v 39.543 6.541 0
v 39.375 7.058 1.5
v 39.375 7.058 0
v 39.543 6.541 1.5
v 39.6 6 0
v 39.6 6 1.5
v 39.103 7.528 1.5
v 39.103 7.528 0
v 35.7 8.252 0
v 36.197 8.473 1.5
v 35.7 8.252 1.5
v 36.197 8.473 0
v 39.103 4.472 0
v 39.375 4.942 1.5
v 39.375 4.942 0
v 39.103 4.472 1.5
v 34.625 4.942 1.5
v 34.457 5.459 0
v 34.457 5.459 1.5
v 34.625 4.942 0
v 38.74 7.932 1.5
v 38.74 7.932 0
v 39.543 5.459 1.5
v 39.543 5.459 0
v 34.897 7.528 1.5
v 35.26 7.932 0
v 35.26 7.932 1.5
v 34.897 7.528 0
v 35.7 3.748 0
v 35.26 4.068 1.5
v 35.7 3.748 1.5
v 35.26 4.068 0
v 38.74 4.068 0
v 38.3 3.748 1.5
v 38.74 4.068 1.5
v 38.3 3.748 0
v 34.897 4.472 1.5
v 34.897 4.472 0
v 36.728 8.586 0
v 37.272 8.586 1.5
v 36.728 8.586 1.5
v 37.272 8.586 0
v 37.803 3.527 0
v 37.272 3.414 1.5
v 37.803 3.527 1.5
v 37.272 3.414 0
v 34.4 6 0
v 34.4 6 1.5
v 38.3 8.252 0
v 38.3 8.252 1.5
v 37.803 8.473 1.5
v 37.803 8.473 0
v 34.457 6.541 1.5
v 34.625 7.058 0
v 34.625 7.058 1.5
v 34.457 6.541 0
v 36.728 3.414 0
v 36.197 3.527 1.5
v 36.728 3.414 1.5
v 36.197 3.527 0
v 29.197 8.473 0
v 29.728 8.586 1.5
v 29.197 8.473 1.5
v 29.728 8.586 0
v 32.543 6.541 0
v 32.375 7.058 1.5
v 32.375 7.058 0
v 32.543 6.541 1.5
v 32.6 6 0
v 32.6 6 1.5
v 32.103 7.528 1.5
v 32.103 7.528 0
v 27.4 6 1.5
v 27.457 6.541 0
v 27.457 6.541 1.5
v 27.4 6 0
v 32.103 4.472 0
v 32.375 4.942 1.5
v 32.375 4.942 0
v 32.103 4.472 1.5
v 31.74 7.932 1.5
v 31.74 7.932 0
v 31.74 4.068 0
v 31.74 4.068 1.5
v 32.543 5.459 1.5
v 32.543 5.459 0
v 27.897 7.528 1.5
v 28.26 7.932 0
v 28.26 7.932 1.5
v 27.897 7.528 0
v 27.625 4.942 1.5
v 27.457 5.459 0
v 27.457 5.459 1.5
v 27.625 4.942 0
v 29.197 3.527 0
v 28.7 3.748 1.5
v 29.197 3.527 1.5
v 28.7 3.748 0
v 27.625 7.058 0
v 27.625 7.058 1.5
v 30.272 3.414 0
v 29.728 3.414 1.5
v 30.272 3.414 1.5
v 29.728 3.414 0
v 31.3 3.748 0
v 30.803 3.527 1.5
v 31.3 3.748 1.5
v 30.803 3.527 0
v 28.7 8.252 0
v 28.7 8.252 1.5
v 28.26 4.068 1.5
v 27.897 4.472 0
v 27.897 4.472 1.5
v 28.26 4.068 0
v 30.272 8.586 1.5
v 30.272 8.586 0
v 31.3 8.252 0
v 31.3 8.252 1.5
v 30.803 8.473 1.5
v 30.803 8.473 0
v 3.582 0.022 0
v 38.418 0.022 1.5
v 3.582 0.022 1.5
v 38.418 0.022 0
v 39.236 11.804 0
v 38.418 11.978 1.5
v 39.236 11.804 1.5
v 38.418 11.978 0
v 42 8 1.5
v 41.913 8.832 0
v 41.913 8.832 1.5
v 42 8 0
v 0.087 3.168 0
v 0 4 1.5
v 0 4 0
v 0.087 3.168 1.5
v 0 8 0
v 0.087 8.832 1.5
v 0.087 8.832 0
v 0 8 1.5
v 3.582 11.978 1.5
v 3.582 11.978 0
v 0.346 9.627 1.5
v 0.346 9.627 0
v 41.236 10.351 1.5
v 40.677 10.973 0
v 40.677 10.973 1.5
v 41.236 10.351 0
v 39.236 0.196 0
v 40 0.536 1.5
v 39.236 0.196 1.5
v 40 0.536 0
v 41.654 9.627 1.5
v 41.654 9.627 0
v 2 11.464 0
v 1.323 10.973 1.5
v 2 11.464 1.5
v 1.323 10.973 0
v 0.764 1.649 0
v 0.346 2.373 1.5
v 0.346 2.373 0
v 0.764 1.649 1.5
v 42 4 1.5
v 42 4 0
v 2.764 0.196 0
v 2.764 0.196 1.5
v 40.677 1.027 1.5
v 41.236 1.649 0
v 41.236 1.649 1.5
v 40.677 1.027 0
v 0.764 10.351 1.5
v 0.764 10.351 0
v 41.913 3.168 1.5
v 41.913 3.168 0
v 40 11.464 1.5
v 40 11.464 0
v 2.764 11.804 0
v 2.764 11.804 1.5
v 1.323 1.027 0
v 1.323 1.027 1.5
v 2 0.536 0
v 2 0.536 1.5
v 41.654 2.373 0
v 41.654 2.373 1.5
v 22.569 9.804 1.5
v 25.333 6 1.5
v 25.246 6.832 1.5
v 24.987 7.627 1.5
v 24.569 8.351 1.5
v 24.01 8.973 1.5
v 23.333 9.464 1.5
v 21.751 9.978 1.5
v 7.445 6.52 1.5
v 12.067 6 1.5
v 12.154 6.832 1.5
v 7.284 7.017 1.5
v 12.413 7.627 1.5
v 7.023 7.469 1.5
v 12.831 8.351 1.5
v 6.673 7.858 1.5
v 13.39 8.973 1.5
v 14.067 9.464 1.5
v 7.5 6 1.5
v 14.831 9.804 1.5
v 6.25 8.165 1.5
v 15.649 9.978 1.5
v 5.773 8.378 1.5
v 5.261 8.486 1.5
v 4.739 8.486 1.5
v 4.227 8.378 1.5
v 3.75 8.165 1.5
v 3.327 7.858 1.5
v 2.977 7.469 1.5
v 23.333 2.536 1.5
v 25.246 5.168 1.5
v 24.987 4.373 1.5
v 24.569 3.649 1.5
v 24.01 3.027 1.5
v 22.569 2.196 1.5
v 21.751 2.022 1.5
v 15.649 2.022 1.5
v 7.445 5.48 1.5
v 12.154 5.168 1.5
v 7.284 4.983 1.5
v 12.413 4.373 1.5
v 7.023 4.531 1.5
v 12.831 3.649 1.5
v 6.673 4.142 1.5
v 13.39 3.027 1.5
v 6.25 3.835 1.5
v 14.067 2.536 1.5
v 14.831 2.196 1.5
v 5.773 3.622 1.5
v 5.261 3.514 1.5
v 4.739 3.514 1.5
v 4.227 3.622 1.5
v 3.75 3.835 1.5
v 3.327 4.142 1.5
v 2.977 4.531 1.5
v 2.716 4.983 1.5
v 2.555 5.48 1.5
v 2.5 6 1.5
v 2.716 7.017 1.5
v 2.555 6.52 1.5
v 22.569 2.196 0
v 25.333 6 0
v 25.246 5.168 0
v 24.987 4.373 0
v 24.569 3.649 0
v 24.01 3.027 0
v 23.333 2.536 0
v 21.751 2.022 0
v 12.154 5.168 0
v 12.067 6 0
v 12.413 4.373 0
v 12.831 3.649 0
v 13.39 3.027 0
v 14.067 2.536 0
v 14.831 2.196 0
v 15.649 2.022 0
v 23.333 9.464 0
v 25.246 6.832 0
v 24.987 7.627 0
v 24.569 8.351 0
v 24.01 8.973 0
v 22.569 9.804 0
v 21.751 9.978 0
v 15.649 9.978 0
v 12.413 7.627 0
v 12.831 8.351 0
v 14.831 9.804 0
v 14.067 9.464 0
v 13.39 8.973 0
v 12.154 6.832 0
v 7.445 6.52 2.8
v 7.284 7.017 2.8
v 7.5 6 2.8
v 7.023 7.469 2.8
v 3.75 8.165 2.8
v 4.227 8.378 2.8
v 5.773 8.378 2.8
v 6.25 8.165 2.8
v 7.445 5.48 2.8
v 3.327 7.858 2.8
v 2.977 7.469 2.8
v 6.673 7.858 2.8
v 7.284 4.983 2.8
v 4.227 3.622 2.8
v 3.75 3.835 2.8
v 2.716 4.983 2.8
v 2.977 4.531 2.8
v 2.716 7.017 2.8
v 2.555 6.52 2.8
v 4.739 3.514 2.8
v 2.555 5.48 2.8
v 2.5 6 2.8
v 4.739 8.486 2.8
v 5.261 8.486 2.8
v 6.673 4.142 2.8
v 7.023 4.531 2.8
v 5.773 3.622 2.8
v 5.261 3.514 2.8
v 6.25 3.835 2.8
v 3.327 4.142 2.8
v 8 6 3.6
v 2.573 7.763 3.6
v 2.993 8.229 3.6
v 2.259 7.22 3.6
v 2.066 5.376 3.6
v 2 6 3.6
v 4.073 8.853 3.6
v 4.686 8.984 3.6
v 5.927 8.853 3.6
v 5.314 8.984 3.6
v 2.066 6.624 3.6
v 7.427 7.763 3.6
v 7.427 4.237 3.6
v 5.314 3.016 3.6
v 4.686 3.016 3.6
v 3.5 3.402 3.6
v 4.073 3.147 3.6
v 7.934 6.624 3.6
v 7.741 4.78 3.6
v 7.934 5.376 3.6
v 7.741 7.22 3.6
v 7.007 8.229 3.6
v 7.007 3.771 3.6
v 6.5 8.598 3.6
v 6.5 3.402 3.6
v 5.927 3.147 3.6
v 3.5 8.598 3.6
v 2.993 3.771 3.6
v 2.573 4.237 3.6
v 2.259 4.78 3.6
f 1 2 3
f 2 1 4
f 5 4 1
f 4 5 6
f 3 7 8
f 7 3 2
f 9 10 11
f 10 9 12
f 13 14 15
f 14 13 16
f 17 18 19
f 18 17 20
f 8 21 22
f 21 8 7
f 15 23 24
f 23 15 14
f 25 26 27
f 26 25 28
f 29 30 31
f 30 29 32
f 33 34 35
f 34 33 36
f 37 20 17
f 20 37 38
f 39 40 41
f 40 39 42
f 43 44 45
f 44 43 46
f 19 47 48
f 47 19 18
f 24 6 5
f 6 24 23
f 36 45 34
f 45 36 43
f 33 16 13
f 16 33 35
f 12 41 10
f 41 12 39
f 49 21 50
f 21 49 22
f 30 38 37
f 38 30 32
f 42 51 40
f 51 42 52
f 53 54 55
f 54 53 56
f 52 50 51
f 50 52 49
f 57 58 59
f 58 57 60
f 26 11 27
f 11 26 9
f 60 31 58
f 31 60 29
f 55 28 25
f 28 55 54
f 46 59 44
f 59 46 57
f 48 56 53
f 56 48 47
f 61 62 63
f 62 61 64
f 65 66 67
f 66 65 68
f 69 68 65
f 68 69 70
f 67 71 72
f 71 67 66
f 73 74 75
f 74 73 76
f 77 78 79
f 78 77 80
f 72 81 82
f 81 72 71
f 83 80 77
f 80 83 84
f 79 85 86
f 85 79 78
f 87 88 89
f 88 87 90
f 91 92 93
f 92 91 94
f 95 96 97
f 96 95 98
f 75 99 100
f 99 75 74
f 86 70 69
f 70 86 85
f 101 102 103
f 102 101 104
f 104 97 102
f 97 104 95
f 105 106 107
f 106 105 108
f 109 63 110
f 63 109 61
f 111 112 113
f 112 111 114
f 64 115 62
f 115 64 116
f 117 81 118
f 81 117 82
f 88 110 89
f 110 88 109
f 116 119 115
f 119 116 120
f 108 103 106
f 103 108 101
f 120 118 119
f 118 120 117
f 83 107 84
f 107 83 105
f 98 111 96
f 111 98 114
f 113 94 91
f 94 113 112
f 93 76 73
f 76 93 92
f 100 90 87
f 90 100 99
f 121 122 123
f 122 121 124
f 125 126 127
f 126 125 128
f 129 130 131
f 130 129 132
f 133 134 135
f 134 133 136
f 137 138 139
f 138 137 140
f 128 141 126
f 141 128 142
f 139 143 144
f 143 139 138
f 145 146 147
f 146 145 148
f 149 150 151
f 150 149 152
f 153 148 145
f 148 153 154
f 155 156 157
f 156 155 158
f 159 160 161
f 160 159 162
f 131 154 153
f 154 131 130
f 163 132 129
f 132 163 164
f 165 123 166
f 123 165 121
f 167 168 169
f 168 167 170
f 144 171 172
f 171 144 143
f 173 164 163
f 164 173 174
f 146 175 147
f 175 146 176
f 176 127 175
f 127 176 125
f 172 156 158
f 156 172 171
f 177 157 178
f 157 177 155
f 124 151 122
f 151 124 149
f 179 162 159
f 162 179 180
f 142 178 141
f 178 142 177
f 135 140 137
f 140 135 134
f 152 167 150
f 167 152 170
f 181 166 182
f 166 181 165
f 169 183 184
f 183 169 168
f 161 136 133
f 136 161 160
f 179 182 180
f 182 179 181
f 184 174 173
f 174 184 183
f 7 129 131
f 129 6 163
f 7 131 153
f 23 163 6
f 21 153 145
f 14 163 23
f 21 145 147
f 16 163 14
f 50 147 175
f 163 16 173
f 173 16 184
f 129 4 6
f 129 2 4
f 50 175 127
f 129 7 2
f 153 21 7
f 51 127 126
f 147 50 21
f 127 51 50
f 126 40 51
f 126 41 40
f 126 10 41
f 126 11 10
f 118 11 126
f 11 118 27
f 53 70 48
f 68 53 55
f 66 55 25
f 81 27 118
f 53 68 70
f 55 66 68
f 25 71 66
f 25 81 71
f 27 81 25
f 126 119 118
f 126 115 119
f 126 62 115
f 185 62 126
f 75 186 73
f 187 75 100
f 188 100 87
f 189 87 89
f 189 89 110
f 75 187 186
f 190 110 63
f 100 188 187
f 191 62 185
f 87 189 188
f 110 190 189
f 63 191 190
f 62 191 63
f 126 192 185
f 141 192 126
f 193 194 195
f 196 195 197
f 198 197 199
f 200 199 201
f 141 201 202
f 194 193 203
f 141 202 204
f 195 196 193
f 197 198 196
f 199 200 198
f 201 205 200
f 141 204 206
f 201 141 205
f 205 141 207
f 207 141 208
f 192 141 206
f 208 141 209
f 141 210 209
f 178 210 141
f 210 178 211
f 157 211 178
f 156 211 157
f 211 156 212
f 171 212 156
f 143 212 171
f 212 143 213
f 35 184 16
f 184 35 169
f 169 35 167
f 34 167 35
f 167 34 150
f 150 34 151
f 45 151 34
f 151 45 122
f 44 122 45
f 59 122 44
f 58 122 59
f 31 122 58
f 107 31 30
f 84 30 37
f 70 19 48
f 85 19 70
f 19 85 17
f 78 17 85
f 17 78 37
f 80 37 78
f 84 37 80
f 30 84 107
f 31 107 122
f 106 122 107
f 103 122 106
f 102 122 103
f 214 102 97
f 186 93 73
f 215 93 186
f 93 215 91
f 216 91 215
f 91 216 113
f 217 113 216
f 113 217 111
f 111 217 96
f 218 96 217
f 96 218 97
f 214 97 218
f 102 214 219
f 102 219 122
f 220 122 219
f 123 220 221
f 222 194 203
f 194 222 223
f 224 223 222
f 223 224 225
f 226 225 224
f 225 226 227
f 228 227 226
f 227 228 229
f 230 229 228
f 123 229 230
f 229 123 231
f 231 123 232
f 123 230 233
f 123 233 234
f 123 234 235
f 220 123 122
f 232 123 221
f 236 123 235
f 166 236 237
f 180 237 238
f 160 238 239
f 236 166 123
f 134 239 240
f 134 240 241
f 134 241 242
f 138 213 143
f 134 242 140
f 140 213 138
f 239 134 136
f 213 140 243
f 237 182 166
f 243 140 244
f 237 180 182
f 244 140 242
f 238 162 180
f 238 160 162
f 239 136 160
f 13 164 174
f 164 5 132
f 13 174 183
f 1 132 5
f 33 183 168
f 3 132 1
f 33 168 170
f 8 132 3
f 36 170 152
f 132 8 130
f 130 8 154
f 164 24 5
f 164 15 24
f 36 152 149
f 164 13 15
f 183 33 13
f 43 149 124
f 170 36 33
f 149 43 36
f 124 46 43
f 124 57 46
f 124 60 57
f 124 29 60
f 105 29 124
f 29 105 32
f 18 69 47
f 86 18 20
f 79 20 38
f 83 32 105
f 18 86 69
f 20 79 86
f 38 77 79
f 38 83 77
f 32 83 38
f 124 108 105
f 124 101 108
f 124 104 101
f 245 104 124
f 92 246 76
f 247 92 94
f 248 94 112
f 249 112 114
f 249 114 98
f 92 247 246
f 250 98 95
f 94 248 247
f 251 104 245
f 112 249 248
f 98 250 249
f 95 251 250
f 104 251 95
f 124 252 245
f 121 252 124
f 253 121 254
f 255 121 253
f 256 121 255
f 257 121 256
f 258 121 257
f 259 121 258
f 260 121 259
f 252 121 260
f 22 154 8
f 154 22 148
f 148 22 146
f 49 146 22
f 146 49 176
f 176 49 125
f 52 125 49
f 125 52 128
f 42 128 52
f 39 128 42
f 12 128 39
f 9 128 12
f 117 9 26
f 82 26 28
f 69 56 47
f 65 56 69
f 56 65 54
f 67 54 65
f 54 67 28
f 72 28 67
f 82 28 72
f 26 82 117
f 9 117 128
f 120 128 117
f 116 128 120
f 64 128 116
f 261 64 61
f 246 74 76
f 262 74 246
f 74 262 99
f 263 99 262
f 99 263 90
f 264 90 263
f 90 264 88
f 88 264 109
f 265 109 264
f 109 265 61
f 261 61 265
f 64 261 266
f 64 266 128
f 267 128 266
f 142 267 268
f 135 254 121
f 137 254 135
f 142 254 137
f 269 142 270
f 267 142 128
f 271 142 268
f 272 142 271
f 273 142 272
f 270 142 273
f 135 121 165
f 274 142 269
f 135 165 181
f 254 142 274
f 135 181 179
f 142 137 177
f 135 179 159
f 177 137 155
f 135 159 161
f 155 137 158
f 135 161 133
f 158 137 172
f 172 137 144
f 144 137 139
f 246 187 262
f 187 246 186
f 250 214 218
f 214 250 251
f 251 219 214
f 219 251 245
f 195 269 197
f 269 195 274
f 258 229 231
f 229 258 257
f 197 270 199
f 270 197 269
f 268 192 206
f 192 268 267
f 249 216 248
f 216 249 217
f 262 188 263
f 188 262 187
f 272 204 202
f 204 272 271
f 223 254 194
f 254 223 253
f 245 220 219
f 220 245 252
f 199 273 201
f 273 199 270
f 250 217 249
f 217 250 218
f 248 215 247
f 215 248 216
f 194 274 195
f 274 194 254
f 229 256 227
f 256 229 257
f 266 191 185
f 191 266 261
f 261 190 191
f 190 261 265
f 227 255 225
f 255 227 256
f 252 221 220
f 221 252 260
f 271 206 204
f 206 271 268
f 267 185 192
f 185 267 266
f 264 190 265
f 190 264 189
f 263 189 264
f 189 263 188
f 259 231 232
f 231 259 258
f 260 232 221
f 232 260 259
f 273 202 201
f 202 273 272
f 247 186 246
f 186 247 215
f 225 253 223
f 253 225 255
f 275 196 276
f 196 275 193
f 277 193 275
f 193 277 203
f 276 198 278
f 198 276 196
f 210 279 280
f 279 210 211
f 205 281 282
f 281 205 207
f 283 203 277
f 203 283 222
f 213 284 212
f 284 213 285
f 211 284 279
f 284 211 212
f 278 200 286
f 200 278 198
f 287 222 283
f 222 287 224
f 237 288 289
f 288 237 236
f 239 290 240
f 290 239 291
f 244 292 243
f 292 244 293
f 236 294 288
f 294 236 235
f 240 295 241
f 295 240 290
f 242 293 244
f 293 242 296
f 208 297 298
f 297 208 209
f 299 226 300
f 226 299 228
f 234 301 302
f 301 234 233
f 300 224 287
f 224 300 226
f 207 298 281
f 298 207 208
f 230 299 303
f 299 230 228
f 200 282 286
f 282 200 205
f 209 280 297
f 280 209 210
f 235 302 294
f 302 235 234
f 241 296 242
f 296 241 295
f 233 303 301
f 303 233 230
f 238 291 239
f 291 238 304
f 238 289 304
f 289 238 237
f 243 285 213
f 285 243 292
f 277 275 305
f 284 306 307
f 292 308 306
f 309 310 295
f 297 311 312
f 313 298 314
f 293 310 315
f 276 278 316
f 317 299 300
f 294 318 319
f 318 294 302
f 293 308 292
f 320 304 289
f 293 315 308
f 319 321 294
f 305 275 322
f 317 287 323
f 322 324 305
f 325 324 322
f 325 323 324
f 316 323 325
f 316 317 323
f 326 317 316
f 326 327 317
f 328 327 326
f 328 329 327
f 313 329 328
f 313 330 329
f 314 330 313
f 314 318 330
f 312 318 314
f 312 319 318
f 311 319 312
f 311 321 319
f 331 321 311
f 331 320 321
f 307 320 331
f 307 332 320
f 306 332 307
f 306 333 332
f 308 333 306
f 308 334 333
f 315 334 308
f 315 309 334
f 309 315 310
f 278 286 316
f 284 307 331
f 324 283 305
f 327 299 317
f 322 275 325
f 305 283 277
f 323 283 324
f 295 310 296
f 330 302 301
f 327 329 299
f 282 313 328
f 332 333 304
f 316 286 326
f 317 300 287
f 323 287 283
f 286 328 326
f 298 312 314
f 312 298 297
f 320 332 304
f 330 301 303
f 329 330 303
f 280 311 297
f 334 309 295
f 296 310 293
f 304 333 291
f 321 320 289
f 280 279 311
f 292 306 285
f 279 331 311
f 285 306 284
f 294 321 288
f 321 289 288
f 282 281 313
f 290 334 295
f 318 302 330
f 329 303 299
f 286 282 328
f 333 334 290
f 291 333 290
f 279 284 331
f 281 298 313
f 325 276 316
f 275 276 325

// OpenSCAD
// Bracelet basic parameters
length = 42;    // Total length in mm
width = 12;      // Width of the band in mm
height = 1.5;    // Thickness/height of the band in mm
bevel_radius = 4; // Radius for the beveled/curved edges

// Improved closure system parameters
peg_diameter = 5;      // Increased diameter for more strength
peg_height = 2.6;      // Taller peg for better retention
peg_top_diameter = 6; // Flared top for secure fastening
peg_base_height = 1;   // Height of the reinforced base
hole_diameter = 5.2;   // Slightly larger than peg for good fit
num_holes = 2;         // Number of adjustment holes
hole_spacing = 7;      // Distance between hole centers
peg_offset = 5;        // Distance from end to peg

// Calculate the available space between peg and the hole area
hole_area_width = (num_holes - 1) * hole_spacing;  // Width of the area containing all holes
last_hole_position = length - peg_offset - (num_holes - 1) * hole_spacing;  // Position of the last hole
peg_position = peg_offset;  // Position of the peg

// Define the safe area for the rectangle
safe_start = peg_position + peg_diameter + 2;  // Safe distance after the peg
safe_end = last_hole_position - hole_diameter/2 - 2;  // Safe distance before the last hole
available_space = safe_end - safe_start;  // Available space for the rectangle

// Center rectangular cutout parameters
rect_width_percentage = 0.99;  // Width as percentage of available space (0.0-1.0)
rect_width = available_space * rect_width_percentage;  // Width calculated automatically
rect_height = 8;      // Height of the rectangular cutout
rect_bevel = 4;       // Bevel radius for the rectangular cutout
rect_offset_y = 0;    // Vertical offset from center (positive = up)

// Calculate the center position between peg and holes area
rect_center = safe_start + (available_space / 2);
rect_offset_x = rect_center - (length/2);  // Offset from bracelet center

module rounded_band() {
    // Create the main band with rounded edges
    hull() {
        translate([bevel_radius, bevel_radius, 0])
        cylinder(r=bevel_radius, h=height, $fn=30);
        
        translate([length - bevel_radius, bevel_radius, 0])
        cylinder(r=bevel_radius, h=height, $fn=30);
        
        translate([bevel_radius, width - bevel_radius, 0])
        cylinder(r=bevel_radius, h=height, $fn=30);
        
        translate([length - bevel_radius, width - bevel_radius, 0])
        cylinder(r=bevel_radius, h=height, $fn=30);
    }
}

// Rounded rectangle cutout module
module rounded_rect_cutout(width, height, radius, thick) {
    hull() {
        translate([radius, radius, -0.1])
        cylinder(r=radius, h=thick+0.2, $fn=30);
        
        translate([width - radius, radius, -0.1])
        cylinder(r=radius, h=thick+0.2, $fn=30);
        
        translate([radius, height - radius, -0.1])
        cylinder(r=radius, h=thick+0.2, $fn=30);
        
        translate([width - radius, height - radius, -0.1])
        cylinder(r=radius, h=thick+0.2, $fn=30);
    }
}

// Main bracelet body with cutouts
difference() {
    rounded_band();
    
    // Create adjustment holes on one end
    for (i = [0:num_holes-1]) {
        translate([length - peg_offset - (i * hole_spacing), width/2, -0.1])
        cylinder(d=hole_diameter, h=height+0.2, $fn=30);
    }
    
    // Add center rectangular cutout
    // Position it in the center between peg and first hole
    translate([length/2 - rect_width/2 + rect_offset_x, width/2 - rect_height/2 + rect_offset_y, 0])
    rounded_rect_cutout(rect_width, rect_height, rect_bevel, height);
}

// Add a single peg on the other end with reinforced base
translate([peg_offset, width/2, 0]) {
    // Reinforced base for the peg
    cylinder(d=peg_diameter + 2, h=peg_base_height, $fn=30);
    
    // Peg with flared top
    translate([0, 0, peg_base_height]) {
        // Main peg body
        cylinder(d1=peg_diameter, d2=peg_diameter, h=peg_height-0.8, $fn=30);
        
        // Flared top portion
        translate([0, 0, peg_height-0.8])
        cylinder(d1=peg_diameter, d2=peg_top_diameter, h=0.8, $fn=30);
    }
}

// Add some debug text to verify dimensions
echo("Total length:", length);
echo("Peg position:", peg_offset);
echo("First hole position:", length - peg_offset);
echo("Last hole position:", last_hole_position);
echo("Safe start position:", safe_start);
echo("Safe end position:", safe_end);
echo("Available space:", available_space);
echo("Rectangle width:", rect_width);
echo("Rectangle center position:", rect_center);
